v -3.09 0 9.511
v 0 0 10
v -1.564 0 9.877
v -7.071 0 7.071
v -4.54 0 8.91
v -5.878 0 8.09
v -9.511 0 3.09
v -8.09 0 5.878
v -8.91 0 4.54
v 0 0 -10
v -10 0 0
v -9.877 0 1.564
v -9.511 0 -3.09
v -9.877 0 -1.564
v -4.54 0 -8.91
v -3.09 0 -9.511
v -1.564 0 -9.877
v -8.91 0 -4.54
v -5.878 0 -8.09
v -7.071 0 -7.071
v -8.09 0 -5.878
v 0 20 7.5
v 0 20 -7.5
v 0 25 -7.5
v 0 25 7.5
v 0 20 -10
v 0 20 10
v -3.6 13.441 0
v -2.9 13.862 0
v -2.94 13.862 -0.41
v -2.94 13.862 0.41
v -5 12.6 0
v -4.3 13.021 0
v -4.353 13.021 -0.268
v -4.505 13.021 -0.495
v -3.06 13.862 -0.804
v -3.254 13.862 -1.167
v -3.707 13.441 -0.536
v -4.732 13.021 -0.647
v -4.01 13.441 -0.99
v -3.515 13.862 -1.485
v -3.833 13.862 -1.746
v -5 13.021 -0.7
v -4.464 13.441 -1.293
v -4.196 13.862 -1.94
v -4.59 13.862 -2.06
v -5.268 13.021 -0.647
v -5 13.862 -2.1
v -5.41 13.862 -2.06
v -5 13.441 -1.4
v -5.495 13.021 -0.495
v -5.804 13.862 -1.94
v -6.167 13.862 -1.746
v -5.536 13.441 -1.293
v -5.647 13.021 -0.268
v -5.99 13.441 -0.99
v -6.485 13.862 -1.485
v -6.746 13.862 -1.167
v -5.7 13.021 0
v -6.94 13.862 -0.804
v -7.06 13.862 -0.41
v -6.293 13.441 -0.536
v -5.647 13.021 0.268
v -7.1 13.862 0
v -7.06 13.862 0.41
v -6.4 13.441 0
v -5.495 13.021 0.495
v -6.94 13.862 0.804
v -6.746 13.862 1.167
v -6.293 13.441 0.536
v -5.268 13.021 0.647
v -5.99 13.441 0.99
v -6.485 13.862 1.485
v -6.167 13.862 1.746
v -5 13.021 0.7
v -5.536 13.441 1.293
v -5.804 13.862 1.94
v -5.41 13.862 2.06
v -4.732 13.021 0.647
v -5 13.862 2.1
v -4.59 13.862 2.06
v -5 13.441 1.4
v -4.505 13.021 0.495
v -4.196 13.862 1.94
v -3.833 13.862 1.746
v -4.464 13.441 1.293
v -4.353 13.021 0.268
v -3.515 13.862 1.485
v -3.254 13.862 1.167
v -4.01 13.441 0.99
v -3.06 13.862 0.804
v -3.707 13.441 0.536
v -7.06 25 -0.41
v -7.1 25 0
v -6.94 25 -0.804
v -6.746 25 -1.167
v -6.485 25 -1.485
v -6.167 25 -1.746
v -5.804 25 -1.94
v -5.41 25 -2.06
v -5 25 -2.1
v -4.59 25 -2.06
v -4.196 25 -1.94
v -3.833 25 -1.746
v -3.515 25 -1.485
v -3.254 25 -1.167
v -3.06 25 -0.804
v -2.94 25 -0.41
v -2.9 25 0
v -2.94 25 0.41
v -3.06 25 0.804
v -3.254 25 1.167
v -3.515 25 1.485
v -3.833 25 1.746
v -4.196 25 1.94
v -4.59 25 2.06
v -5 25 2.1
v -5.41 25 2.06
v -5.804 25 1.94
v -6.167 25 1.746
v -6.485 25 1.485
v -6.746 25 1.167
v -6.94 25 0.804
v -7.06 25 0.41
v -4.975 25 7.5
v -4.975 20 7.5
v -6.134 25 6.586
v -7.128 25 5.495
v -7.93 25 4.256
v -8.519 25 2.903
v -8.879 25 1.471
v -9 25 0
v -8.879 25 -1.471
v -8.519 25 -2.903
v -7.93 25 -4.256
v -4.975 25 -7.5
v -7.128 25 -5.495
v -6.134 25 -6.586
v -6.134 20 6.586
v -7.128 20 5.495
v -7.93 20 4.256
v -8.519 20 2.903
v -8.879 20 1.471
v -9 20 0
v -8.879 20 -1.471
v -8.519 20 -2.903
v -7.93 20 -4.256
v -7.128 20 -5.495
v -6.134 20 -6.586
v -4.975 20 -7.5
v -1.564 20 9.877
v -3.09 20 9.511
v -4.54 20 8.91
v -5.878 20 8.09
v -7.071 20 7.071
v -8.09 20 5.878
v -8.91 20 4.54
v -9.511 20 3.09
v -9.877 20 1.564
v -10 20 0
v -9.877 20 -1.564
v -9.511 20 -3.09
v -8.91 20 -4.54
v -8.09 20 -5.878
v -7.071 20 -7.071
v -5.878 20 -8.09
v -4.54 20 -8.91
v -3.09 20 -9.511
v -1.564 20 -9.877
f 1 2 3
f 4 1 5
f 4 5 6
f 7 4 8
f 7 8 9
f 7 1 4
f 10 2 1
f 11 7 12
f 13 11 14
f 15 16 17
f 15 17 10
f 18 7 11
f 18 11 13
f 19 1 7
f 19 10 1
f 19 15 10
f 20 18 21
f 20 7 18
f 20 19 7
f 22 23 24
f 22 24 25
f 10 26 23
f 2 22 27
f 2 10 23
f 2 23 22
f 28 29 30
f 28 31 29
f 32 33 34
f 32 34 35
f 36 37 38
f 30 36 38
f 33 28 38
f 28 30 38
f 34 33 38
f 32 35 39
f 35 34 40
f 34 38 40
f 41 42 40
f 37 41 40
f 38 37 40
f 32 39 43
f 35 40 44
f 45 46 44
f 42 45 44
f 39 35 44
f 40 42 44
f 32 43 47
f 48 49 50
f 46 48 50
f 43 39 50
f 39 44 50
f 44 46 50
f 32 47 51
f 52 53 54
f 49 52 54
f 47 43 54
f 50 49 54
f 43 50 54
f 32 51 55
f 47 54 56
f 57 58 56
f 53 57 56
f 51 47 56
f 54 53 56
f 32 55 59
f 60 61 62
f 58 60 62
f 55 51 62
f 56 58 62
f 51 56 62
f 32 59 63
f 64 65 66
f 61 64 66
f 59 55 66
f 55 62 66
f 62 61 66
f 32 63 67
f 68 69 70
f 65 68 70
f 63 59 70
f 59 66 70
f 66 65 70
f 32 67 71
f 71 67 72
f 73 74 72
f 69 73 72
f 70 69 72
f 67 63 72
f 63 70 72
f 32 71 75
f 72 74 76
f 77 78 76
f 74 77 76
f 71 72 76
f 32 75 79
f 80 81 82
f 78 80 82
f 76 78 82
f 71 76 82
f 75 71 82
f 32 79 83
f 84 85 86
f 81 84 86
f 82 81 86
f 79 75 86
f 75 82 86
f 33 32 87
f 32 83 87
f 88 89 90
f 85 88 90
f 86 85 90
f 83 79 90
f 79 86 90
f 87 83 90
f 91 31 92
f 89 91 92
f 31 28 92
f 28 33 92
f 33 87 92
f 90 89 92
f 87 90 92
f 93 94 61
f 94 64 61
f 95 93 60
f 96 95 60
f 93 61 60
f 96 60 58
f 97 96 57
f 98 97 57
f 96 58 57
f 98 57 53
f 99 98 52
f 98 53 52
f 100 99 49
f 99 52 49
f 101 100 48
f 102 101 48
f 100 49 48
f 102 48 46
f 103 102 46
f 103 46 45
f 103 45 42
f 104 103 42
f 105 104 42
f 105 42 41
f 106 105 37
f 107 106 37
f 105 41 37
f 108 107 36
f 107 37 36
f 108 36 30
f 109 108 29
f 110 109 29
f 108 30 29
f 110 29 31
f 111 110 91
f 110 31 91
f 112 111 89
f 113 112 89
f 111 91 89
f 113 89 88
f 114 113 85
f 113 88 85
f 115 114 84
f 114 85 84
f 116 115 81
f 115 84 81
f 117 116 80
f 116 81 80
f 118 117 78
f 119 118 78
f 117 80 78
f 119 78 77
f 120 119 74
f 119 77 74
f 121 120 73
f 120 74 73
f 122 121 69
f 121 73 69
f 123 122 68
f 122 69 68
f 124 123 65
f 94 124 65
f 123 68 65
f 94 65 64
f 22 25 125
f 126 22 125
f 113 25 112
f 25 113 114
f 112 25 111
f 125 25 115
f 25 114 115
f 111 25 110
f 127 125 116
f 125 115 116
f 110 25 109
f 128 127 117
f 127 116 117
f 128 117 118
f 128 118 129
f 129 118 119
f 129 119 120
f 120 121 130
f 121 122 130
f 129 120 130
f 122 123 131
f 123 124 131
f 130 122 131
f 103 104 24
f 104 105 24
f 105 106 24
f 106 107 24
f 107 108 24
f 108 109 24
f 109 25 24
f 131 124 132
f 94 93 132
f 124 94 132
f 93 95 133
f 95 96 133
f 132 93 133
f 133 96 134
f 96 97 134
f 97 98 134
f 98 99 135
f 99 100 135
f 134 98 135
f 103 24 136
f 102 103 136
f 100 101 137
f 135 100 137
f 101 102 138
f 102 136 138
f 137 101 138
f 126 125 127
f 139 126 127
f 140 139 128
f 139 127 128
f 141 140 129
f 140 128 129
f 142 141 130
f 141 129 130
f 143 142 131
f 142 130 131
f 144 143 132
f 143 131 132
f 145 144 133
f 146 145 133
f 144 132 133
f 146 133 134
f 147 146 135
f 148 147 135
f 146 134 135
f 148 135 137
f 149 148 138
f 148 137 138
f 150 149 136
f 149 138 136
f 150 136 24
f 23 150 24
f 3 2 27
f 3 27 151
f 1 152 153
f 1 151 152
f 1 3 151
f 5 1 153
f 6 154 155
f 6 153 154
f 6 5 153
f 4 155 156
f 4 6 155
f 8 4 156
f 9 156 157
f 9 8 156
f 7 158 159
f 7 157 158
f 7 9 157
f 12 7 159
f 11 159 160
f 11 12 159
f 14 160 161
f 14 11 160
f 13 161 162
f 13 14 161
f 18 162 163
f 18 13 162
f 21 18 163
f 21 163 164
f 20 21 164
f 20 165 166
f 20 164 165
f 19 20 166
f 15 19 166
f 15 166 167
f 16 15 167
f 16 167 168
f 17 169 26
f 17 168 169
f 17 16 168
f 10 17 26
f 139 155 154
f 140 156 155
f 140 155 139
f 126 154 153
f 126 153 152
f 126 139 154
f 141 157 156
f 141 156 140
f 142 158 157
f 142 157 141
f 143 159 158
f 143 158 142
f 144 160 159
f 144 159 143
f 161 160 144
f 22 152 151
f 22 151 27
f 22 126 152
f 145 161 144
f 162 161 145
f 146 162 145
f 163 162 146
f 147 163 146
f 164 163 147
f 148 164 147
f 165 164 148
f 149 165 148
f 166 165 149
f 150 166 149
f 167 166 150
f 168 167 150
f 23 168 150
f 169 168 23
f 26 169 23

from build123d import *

# Parameters (mm, degrees)
BOSS_EXTRUDE1_DEPTH   = 25
CUT_EXTRUDE1_DEPTH    = 5
M5_TAPPED_HOLE1_D     = 4.2
M5_TAPPED_HOLE1_DEPTH = 11.1381927
M5_TAPPED_HOLE1_TIP   = 1.2618073


with BuildPart() as part:
    # Sketch1 → Boss-Extrude1 (new body)
    with BuildSketch(Plane(origin=(0, 0, 0), x_dir=(1, 0, 0), z_dir=(0, 1, 0))):
        with BuildLine():
            Line((0, 10), (0, -10))
            ThreePointArc((0, -10), (-10, 0), (0, 10))
        make_face()
    extrude(amount=BOSS_EXTRUDE1_DEPTH)

    # Sketch18 → Cut-Extrude1 (cut)
    with BuildSketch(Plane(origin=(0, 25, 0), x_dir=(1, 0, 0), z_dir=(0, 1, 0))):
        with BuildLine():
            Line((0, 7.5), (0, 10))
            ThreePointArc((0, 10), (-10, 0), (0, -10))
            Line((0, -10), (0, -7.5))
            Line((0, -7.5), (-4.974937186, -7.5))
            ThreePointArc((-4.974937186, -7.5), (-9, 0), (-4.974937186, 7.5))
            Line((-4.974937186, 7.5), (0, 7.5))
        make_face()
    extrude(amount=-CUT_EXTRUDE1_DEPTH, mode=Mode.SUBTRACT)

    # M5 Tapped Hole1
    with Locations(Plane(origin=(0, 25, 0), x_dir=(1, 0, 0), z_dir=(0, 1, 0))):
        with Locations((-5, 0)):
            Hole(M5_TAPPED_HOLE1_D / 2, depth=M5_TAPPED_HOLE1_DEPTH)
            with Locations((0, 0, -(M5_TAPPED_HOLE1_DEPTH + M5_TAPPED_HOLE1_TIP / 2))):  # 118° drill point
                Cone(0, M5_TAPPED_HOLE1_D / 2, M5_TAPPED_HOLE1_TIP, mode=Mode.SUBTRACT)


solid = part.part
